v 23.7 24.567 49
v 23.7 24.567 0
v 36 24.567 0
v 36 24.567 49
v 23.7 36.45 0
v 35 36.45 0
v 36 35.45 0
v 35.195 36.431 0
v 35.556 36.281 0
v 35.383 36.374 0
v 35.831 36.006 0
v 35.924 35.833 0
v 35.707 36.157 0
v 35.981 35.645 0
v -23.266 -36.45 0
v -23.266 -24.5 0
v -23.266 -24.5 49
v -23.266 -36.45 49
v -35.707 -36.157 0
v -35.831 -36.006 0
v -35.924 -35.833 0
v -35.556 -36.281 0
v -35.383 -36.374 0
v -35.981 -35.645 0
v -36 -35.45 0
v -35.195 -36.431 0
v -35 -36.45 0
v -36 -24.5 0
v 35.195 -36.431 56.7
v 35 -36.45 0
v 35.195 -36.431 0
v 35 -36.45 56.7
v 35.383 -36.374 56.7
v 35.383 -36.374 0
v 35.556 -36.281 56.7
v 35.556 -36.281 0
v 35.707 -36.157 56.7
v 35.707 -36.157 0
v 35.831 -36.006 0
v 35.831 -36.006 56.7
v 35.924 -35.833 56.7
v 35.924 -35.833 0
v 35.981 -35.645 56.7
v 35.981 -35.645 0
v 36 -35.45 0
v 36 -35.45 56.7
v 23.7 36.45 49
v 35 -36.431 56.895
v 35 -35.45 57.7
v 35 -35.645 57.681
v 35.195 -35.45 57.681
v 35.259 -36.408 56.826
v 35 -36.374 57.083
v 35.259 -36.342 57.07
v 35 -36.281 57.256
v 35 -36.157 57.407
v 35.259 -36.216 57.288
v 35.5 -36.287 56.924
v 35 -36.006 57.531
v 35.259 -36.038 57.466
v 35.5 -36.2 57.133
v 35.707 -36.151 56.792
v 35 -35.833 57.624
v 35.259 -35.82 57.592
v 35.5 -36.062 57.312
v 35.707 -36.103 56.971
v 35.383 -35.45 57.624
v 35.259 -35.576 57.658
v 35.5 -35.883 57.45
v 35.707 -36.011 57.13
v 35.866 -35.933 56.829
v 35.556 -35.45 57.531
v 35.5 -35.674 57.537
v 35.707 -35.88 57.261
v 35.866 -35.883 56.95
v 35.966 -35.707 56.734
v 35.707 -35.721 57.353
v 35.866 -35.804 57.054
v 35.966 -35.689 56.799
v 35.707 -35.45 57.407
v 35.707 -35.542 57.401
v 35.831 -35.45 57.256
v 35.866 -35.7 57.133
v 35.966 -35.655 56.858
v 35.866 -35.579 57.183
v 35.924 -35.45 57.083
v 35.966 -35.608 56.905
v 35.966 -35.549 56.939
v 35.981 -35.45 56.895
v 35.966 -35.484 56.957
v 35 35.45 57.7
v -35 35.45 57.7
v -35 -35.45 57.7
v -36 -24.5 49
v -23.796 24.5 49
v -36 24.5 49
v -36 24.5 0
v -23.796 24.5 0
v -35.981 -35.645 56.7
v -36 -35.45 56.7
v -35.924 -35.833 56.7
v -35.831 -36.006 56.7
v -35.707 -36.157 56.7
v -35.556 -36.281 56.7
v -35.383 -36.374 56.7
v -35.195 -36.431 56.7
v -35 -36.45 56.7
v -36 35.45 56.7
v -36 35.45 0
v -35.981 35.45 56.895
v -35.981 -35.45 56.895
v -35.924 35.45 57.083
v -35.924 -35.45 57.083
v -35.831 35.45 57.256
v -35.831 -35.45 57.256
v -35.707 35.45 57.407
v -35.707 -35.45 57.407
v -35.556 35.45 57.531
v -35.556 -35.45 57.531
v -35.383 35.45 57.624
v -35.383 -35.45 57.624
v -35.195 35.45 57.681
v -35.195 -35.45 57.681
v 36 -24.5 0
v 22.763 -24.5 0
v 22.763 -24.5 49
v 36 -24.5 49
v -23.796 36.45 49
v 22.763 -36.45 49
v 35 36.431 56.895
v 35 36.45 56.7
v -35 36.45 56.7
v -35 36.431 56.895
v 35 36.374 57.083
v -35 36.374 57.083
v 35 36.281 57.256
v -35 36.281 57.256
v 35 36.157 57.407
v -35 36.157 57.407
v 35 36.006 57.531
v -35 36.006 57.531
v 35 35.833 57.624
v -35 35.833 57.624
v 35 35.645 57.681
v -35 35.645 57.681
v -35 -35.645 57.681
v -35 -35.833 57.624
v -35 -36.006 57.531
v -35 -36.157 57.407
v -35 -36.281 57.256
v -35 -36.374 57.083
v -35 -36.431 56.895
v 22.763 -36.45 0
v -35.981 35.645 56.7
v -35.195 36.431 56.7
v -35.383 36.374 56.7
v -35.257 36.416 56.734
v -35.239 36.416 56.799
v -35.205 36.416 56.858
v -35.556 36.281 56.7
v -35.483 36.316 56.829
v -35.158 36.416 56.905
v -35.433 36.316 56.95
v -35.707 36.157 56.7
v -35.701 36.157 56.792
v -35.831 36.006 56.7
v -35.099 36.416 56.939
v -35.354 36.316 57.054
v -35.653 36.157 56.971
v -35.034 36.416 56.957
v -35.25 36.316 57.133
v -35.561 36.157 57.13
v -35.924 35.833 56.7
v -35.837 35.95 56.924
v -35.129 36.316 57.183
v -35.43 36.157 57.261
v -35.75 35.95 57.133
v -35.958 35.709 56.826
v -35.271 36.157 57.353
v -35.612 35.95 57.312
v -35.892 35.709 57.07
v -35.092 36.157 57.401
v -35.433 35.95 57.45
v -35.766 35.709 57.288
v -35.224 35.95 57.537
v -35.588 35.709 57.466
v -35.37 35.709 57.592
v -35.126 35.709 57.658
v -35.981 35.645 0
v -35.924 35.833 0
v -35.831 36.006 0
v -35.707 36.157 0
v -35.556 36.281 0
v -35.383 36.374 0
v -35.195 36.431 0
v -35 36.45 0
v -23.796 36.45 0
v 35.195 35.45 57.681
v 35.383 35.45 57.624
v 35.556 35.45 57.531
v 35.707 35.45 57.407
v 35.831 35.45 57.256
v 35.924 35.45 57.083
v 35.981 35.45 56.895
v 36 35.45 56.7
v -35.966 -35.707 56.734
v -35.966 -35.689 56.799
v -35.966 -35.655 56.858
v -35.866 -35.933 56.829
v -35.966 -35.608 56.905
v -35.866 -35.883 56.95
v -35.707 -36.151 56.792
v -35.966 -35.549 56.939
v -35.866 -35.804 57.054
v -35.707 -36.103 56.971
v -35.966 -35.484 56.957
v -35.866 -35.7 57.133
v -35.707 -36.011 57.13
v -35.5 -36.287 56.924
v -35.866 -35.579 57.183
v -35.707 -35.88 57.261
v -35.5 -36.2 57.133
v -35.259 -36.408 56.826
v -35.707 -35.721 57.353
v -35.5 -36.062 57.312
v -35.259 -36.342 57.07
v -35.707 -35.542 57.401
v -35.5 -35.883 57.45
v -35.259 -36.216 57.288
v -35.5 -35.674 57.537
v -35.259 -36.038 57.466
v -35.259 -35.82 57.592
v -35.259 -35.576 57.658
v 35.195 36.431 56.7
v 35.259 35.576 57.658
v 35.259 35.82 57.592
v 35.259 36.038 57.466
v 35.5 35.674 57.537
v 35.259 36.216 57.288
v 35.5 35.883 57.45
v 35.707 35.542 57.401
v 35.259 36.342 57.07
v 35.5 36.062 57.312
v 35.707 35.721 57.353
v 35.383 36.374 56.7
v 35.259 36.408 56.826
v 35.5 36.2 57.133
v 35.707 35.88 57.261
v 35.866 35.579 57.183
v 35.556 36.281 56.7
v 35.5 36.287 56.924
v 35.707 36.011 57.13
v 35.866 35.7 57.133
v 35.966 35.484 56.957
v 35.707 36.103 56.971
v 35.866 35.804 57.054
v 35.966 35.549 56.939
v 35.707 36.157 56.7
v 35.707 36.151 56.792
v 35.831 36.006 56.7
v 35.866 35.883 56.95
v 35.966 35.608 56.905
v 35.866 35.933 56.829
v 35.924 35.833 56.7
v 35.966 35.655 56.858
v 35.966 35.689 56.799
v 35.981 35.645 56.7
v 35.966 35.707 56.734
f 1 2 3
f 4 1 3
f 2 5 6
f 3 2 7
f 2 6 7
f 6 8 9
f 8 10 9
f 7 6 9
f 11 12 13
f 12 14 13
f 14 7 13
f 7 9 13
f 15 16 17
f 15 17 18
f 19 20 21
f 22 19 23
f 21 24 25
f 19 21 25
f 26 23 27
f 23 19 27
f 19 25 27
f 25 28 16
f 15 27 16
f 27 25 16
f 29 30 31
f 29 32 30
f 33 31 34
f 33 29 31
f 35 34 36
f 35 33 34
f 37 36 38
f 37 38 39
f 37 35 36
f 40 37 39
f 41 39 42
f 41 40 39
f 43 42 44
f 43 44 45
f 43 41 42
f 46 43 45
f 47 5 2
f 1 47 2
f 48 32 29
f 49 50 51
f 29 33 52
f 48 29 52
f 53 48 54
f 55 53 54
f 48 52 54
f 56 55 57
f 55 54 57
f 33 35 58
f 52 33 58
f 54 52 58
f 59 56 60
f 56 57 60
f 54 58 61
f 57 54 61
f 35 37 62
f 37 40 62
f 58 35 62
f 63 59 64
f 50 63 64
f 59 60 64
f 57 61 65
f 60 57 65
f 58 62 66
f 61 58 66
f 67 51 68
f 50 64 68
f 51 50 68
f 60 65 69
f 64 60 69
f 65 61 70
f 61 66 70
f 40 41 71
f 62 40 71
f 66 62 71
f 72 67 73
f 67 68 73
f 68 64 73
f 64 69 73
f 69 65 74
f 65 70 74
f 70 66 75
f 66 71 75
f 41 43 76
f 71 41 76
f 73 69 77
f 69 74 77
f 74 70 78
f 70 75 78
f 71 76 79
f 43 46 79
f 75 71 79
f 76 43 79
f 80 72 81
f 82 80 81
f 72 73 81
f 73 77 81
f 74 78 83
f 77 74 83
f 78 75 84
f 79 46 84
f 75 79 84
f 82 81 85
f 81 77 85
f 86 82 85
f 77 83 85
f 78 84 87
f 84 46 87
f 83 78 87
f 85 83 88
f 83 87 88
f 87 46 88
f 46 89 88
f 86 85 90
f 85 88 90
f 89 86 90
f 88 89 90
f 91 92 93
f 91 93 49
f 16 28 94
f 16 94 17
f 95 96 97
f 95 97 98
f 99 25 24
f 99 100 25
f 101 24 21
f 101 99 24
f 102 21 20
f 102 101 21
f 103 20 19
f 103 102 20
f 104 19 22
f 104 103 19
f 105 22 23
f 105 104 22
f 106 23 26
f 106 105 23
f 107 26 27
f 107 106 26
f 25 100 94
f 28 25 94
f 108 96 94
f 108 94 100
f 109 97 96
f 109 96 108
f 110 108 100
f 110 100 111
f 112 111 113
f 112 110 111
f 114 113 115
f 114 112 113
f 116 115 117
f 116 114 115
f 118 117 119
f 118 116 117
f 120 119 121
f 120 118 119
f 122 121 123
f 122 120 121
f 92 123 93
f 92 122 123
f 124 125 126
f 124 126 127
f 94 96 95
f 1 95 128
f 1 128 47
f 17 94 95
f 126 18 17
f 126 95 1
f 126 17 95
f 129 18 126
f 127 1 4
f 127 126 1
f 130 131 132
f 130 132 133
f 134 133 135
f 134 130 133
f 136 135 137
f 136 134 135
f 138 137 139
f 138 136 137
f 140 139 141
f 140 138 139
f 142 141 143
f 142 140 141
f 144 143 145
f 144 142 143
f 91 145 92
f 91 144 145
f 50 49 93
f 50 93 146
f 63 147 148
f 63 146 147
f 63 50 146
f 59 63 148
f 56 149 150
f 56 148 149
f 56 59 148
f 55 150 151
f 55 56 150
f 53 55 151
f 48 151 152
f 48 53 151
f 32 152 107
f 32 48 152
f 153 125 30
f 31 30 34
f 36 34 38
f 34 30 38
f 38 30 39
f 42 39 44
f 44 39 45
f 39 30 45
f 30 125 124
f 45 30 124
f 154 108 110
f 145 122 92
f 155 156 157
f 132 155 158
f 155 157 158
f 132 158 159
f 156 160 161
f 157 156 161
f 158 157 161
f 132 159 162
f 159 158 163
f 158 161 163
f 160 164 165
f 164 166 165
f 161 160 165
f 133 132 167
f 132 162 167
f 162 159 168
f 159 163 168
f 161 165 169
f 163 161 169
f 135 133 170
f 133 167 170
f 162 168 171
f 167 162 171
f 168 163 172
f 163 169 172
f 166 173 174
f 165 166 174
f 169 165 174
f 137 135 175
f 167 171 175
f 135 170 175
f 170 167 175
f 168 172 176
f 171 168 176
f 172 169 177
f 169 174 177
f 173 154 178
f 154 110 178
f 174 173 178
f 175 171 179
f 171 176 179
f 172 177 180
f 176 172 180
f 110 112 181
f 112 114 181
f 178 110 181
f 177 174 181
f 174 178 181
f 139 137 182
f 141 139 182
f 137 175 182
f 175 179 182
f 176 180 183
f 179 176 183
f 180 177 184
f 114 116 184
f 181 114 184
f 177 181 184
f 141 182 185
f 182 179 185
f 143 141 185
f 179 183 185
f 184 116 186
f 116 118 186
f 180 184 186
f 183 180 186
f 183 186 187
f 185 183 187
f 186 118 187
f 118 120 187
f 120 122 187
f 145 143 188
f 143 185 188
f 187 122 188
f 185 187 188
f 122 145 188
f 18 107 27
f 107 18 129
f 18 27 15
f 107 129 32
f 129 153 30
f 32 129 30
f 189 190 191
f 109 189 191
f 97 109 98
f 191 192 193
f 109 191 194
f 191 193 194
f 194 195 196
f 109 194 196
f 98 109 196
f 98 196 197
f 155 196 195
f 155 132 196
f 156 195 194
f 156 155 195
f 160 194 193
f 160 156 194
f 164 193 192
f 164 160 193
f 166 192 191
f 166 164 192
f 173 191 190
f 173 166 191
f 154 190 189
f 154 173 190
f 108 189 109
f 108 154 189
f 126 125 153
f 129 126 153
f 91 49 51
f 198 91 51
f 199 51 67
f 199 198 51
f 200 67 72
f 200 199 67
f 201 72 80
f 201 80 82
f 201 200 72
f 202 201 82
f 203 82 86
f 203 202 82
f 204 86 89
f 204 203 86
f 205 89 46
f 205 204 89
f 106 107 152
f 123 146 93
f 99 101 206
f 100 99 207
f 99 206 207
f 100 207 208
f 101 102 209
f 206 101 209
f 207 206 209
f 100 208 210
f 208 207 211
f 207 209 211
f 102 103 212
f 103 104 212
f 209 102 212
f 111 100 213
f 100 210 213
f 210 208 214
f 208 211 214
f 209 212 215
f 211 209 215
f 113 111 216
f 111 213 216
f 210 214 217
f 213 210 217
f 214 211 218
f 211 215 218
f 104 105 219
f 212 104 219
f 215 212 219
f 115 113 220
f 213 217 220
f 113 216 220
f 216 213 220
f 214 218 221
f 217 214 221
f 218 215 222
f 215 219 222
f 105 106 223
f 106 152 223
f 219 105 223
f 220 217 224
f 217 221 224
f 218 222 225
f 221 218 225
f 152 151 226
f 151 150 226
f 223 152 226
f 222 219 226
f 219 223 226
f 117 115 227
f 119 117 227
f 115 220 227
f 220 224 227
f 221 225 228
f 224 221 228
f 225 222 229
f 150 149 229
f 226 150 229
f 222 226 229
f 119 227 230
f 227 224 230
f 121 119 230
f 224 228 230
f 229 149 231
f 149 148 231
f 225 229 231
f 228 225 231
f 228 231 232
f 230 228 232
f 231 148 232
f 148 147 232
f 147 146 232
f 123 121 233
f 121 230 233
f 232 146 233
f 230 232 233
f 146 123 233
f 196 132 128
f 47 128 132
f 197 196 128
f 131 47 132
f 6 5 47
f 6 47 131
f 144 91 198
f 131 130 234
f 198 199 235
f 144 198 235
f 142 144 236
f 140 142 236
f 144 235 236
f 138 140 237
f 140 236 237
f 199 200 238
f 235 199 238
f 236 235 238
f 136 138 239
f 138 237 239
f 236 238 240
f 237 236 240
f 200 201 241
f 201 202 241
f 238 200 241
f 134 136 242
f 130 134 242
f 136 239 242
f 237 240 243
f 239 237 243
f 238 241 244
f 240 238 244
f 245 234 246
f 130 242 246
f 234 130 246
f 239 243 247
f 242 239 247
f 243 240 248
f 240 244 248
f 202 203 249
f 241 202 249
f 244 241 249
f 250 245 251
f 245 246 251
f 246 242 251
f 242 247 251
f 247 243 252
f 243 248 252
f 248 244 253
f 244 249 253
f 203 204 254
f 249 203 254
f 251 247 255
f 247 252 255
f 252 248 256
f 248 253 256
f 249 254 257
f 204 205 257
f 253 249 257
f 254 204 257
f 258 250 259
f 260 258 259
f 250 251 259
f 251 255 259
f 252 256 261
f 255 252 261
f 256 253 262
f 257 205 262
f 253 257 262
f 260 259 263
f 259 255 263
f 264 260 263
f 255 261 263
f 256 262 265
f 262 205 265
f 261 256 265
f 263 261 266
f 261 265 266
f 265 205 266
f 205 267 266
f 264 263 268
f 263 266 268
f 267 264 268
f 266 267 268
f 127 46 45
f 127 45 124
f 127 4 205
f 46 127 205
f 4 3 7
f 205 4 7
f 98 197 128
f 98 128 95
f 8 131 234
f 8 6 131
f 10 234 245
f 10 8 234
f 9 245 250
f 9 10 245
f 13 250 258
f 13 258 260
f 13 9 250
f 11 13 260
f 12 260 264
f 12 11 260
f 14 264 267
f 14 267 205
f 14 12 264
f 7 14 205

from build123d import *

# Parameters (mm, degrees)
F0_W      = 72.0000043511
F0_H      = 72.9000046849
F1_DEPTH  = 57.7
F2_W      = 47.4000014365
F2_H      = 48.9999987185
F3_DEPTH  = 49
F4_W      = 12.3000014573
F4_H      = 48.9999987185
F5_DEPTH  = 49
F6_W      = 12.3000014573
F6_H      = 49.0666516125
F7_DEPTH  = 49
F8_W      = 47.4963821471
F8_H      = 11.9500029832
F9_DEPTH  = 49
F10_W     = 46.0287183523
F10_H     = 11.9500029832
F11_DEPTH = 49
F12_R     = 1
F13_R     = 1
F14_R     = 1
F15_R     = 1


with BuildPart() as f1:
    # F0 (on Top) → F1 (new body)
    with BuildSketch(Plane.XY):
        Rectangle(F0_W, F0_H)
    extrude(amount=F1_DEPTH)

    # F2 (on face) → F3 (cut)
    with BuildSketch(Plane(origin=(0, 0, 0), x_dir=(1, 0, 0), z_dir=(0, 0, -1))):
        Rectangle(F2_W, F2_H)
    extrude(amount=-F3_DEPTH, mode=Mode.SUBTRACT)

    # F4 (on face) → F5 (cut)
    with BuildSketch(Plane(origin=(0, 0, 0), x_dir=(1, 0, 0), z_dir=(0, 0, -1))):
        with Locations((-29.8500014469, 0)):
            Rectangle(F4_W, F4_H)
    extrude(amount=-F5_DEPTH, mode=Mode.SUBTRACT)

    # F6 (on face) → F7 (cut)
    with BuildSketch(Plane(origin=(0, 0, 0), x_dir=(1, 0, 0), z_dir=(0, 0, -1))):
        with Locations((29.8500014469, -0.033326447)):
            Rectangle(F6_W, F6_H)
    extrude(amount=-F7_DEPTH, mode=Mode.SUBTRACT)

    # F8 (on face) → F9 (cut)
    with BuildSketch(Plane(origin=(0, 0, 0), x_dir=(1, 0, 0), z_dir=(0, 0, -1))):
        with Locations((-0.0481903553, -30.4750008509)):
            Rectangle(F8_W, F8_H)
    extrude(amount=-F9_DEPTH, mode=Mode.SUBTRACT)

    # F10 (on face) → F11 (cut)
    with BuildSketch(Plane(origin=(0, 0, 0), x_dir=(1, 0, 0), z_dir=(0, 0, -1))):
        with Locations((-0.2511702478, 30.4750008509)):
            Rectangle(F10_W, F10_H)
    extrude(amount=-F11_DEPTH, mode=Mode.SUBTRACT)

    # F12
    f12_edges = [f1.edges().sort_by_distance(p)[0] for p in [
        (0, -36.450002, 57.7),
    ]]
    fillet(f12_edges, radius=F12_R)

    # F13
    f13_edges = [f1.edges().sort_by_distance(p)[0] for p in [
        (-36.000002, 0.5, 57.7),
    ]]
    fillet(f13_edges, radius=F13_R)

    # F14
    f14_edges = [f1.edges().sort_by_distance(p)[0] for p in [
        (0.5, 36.450002, 57.7),
    ]]
    fillet(f14_edges, radius=F14_R)

    # F15
    f15_edges = [f1.edges().sort_by_distance(p)[0] for p in [
        (36.000002, 0, 57.7),
    ]]
    fillet(f15_edges, radius=F15_R)


solid = f1.part
